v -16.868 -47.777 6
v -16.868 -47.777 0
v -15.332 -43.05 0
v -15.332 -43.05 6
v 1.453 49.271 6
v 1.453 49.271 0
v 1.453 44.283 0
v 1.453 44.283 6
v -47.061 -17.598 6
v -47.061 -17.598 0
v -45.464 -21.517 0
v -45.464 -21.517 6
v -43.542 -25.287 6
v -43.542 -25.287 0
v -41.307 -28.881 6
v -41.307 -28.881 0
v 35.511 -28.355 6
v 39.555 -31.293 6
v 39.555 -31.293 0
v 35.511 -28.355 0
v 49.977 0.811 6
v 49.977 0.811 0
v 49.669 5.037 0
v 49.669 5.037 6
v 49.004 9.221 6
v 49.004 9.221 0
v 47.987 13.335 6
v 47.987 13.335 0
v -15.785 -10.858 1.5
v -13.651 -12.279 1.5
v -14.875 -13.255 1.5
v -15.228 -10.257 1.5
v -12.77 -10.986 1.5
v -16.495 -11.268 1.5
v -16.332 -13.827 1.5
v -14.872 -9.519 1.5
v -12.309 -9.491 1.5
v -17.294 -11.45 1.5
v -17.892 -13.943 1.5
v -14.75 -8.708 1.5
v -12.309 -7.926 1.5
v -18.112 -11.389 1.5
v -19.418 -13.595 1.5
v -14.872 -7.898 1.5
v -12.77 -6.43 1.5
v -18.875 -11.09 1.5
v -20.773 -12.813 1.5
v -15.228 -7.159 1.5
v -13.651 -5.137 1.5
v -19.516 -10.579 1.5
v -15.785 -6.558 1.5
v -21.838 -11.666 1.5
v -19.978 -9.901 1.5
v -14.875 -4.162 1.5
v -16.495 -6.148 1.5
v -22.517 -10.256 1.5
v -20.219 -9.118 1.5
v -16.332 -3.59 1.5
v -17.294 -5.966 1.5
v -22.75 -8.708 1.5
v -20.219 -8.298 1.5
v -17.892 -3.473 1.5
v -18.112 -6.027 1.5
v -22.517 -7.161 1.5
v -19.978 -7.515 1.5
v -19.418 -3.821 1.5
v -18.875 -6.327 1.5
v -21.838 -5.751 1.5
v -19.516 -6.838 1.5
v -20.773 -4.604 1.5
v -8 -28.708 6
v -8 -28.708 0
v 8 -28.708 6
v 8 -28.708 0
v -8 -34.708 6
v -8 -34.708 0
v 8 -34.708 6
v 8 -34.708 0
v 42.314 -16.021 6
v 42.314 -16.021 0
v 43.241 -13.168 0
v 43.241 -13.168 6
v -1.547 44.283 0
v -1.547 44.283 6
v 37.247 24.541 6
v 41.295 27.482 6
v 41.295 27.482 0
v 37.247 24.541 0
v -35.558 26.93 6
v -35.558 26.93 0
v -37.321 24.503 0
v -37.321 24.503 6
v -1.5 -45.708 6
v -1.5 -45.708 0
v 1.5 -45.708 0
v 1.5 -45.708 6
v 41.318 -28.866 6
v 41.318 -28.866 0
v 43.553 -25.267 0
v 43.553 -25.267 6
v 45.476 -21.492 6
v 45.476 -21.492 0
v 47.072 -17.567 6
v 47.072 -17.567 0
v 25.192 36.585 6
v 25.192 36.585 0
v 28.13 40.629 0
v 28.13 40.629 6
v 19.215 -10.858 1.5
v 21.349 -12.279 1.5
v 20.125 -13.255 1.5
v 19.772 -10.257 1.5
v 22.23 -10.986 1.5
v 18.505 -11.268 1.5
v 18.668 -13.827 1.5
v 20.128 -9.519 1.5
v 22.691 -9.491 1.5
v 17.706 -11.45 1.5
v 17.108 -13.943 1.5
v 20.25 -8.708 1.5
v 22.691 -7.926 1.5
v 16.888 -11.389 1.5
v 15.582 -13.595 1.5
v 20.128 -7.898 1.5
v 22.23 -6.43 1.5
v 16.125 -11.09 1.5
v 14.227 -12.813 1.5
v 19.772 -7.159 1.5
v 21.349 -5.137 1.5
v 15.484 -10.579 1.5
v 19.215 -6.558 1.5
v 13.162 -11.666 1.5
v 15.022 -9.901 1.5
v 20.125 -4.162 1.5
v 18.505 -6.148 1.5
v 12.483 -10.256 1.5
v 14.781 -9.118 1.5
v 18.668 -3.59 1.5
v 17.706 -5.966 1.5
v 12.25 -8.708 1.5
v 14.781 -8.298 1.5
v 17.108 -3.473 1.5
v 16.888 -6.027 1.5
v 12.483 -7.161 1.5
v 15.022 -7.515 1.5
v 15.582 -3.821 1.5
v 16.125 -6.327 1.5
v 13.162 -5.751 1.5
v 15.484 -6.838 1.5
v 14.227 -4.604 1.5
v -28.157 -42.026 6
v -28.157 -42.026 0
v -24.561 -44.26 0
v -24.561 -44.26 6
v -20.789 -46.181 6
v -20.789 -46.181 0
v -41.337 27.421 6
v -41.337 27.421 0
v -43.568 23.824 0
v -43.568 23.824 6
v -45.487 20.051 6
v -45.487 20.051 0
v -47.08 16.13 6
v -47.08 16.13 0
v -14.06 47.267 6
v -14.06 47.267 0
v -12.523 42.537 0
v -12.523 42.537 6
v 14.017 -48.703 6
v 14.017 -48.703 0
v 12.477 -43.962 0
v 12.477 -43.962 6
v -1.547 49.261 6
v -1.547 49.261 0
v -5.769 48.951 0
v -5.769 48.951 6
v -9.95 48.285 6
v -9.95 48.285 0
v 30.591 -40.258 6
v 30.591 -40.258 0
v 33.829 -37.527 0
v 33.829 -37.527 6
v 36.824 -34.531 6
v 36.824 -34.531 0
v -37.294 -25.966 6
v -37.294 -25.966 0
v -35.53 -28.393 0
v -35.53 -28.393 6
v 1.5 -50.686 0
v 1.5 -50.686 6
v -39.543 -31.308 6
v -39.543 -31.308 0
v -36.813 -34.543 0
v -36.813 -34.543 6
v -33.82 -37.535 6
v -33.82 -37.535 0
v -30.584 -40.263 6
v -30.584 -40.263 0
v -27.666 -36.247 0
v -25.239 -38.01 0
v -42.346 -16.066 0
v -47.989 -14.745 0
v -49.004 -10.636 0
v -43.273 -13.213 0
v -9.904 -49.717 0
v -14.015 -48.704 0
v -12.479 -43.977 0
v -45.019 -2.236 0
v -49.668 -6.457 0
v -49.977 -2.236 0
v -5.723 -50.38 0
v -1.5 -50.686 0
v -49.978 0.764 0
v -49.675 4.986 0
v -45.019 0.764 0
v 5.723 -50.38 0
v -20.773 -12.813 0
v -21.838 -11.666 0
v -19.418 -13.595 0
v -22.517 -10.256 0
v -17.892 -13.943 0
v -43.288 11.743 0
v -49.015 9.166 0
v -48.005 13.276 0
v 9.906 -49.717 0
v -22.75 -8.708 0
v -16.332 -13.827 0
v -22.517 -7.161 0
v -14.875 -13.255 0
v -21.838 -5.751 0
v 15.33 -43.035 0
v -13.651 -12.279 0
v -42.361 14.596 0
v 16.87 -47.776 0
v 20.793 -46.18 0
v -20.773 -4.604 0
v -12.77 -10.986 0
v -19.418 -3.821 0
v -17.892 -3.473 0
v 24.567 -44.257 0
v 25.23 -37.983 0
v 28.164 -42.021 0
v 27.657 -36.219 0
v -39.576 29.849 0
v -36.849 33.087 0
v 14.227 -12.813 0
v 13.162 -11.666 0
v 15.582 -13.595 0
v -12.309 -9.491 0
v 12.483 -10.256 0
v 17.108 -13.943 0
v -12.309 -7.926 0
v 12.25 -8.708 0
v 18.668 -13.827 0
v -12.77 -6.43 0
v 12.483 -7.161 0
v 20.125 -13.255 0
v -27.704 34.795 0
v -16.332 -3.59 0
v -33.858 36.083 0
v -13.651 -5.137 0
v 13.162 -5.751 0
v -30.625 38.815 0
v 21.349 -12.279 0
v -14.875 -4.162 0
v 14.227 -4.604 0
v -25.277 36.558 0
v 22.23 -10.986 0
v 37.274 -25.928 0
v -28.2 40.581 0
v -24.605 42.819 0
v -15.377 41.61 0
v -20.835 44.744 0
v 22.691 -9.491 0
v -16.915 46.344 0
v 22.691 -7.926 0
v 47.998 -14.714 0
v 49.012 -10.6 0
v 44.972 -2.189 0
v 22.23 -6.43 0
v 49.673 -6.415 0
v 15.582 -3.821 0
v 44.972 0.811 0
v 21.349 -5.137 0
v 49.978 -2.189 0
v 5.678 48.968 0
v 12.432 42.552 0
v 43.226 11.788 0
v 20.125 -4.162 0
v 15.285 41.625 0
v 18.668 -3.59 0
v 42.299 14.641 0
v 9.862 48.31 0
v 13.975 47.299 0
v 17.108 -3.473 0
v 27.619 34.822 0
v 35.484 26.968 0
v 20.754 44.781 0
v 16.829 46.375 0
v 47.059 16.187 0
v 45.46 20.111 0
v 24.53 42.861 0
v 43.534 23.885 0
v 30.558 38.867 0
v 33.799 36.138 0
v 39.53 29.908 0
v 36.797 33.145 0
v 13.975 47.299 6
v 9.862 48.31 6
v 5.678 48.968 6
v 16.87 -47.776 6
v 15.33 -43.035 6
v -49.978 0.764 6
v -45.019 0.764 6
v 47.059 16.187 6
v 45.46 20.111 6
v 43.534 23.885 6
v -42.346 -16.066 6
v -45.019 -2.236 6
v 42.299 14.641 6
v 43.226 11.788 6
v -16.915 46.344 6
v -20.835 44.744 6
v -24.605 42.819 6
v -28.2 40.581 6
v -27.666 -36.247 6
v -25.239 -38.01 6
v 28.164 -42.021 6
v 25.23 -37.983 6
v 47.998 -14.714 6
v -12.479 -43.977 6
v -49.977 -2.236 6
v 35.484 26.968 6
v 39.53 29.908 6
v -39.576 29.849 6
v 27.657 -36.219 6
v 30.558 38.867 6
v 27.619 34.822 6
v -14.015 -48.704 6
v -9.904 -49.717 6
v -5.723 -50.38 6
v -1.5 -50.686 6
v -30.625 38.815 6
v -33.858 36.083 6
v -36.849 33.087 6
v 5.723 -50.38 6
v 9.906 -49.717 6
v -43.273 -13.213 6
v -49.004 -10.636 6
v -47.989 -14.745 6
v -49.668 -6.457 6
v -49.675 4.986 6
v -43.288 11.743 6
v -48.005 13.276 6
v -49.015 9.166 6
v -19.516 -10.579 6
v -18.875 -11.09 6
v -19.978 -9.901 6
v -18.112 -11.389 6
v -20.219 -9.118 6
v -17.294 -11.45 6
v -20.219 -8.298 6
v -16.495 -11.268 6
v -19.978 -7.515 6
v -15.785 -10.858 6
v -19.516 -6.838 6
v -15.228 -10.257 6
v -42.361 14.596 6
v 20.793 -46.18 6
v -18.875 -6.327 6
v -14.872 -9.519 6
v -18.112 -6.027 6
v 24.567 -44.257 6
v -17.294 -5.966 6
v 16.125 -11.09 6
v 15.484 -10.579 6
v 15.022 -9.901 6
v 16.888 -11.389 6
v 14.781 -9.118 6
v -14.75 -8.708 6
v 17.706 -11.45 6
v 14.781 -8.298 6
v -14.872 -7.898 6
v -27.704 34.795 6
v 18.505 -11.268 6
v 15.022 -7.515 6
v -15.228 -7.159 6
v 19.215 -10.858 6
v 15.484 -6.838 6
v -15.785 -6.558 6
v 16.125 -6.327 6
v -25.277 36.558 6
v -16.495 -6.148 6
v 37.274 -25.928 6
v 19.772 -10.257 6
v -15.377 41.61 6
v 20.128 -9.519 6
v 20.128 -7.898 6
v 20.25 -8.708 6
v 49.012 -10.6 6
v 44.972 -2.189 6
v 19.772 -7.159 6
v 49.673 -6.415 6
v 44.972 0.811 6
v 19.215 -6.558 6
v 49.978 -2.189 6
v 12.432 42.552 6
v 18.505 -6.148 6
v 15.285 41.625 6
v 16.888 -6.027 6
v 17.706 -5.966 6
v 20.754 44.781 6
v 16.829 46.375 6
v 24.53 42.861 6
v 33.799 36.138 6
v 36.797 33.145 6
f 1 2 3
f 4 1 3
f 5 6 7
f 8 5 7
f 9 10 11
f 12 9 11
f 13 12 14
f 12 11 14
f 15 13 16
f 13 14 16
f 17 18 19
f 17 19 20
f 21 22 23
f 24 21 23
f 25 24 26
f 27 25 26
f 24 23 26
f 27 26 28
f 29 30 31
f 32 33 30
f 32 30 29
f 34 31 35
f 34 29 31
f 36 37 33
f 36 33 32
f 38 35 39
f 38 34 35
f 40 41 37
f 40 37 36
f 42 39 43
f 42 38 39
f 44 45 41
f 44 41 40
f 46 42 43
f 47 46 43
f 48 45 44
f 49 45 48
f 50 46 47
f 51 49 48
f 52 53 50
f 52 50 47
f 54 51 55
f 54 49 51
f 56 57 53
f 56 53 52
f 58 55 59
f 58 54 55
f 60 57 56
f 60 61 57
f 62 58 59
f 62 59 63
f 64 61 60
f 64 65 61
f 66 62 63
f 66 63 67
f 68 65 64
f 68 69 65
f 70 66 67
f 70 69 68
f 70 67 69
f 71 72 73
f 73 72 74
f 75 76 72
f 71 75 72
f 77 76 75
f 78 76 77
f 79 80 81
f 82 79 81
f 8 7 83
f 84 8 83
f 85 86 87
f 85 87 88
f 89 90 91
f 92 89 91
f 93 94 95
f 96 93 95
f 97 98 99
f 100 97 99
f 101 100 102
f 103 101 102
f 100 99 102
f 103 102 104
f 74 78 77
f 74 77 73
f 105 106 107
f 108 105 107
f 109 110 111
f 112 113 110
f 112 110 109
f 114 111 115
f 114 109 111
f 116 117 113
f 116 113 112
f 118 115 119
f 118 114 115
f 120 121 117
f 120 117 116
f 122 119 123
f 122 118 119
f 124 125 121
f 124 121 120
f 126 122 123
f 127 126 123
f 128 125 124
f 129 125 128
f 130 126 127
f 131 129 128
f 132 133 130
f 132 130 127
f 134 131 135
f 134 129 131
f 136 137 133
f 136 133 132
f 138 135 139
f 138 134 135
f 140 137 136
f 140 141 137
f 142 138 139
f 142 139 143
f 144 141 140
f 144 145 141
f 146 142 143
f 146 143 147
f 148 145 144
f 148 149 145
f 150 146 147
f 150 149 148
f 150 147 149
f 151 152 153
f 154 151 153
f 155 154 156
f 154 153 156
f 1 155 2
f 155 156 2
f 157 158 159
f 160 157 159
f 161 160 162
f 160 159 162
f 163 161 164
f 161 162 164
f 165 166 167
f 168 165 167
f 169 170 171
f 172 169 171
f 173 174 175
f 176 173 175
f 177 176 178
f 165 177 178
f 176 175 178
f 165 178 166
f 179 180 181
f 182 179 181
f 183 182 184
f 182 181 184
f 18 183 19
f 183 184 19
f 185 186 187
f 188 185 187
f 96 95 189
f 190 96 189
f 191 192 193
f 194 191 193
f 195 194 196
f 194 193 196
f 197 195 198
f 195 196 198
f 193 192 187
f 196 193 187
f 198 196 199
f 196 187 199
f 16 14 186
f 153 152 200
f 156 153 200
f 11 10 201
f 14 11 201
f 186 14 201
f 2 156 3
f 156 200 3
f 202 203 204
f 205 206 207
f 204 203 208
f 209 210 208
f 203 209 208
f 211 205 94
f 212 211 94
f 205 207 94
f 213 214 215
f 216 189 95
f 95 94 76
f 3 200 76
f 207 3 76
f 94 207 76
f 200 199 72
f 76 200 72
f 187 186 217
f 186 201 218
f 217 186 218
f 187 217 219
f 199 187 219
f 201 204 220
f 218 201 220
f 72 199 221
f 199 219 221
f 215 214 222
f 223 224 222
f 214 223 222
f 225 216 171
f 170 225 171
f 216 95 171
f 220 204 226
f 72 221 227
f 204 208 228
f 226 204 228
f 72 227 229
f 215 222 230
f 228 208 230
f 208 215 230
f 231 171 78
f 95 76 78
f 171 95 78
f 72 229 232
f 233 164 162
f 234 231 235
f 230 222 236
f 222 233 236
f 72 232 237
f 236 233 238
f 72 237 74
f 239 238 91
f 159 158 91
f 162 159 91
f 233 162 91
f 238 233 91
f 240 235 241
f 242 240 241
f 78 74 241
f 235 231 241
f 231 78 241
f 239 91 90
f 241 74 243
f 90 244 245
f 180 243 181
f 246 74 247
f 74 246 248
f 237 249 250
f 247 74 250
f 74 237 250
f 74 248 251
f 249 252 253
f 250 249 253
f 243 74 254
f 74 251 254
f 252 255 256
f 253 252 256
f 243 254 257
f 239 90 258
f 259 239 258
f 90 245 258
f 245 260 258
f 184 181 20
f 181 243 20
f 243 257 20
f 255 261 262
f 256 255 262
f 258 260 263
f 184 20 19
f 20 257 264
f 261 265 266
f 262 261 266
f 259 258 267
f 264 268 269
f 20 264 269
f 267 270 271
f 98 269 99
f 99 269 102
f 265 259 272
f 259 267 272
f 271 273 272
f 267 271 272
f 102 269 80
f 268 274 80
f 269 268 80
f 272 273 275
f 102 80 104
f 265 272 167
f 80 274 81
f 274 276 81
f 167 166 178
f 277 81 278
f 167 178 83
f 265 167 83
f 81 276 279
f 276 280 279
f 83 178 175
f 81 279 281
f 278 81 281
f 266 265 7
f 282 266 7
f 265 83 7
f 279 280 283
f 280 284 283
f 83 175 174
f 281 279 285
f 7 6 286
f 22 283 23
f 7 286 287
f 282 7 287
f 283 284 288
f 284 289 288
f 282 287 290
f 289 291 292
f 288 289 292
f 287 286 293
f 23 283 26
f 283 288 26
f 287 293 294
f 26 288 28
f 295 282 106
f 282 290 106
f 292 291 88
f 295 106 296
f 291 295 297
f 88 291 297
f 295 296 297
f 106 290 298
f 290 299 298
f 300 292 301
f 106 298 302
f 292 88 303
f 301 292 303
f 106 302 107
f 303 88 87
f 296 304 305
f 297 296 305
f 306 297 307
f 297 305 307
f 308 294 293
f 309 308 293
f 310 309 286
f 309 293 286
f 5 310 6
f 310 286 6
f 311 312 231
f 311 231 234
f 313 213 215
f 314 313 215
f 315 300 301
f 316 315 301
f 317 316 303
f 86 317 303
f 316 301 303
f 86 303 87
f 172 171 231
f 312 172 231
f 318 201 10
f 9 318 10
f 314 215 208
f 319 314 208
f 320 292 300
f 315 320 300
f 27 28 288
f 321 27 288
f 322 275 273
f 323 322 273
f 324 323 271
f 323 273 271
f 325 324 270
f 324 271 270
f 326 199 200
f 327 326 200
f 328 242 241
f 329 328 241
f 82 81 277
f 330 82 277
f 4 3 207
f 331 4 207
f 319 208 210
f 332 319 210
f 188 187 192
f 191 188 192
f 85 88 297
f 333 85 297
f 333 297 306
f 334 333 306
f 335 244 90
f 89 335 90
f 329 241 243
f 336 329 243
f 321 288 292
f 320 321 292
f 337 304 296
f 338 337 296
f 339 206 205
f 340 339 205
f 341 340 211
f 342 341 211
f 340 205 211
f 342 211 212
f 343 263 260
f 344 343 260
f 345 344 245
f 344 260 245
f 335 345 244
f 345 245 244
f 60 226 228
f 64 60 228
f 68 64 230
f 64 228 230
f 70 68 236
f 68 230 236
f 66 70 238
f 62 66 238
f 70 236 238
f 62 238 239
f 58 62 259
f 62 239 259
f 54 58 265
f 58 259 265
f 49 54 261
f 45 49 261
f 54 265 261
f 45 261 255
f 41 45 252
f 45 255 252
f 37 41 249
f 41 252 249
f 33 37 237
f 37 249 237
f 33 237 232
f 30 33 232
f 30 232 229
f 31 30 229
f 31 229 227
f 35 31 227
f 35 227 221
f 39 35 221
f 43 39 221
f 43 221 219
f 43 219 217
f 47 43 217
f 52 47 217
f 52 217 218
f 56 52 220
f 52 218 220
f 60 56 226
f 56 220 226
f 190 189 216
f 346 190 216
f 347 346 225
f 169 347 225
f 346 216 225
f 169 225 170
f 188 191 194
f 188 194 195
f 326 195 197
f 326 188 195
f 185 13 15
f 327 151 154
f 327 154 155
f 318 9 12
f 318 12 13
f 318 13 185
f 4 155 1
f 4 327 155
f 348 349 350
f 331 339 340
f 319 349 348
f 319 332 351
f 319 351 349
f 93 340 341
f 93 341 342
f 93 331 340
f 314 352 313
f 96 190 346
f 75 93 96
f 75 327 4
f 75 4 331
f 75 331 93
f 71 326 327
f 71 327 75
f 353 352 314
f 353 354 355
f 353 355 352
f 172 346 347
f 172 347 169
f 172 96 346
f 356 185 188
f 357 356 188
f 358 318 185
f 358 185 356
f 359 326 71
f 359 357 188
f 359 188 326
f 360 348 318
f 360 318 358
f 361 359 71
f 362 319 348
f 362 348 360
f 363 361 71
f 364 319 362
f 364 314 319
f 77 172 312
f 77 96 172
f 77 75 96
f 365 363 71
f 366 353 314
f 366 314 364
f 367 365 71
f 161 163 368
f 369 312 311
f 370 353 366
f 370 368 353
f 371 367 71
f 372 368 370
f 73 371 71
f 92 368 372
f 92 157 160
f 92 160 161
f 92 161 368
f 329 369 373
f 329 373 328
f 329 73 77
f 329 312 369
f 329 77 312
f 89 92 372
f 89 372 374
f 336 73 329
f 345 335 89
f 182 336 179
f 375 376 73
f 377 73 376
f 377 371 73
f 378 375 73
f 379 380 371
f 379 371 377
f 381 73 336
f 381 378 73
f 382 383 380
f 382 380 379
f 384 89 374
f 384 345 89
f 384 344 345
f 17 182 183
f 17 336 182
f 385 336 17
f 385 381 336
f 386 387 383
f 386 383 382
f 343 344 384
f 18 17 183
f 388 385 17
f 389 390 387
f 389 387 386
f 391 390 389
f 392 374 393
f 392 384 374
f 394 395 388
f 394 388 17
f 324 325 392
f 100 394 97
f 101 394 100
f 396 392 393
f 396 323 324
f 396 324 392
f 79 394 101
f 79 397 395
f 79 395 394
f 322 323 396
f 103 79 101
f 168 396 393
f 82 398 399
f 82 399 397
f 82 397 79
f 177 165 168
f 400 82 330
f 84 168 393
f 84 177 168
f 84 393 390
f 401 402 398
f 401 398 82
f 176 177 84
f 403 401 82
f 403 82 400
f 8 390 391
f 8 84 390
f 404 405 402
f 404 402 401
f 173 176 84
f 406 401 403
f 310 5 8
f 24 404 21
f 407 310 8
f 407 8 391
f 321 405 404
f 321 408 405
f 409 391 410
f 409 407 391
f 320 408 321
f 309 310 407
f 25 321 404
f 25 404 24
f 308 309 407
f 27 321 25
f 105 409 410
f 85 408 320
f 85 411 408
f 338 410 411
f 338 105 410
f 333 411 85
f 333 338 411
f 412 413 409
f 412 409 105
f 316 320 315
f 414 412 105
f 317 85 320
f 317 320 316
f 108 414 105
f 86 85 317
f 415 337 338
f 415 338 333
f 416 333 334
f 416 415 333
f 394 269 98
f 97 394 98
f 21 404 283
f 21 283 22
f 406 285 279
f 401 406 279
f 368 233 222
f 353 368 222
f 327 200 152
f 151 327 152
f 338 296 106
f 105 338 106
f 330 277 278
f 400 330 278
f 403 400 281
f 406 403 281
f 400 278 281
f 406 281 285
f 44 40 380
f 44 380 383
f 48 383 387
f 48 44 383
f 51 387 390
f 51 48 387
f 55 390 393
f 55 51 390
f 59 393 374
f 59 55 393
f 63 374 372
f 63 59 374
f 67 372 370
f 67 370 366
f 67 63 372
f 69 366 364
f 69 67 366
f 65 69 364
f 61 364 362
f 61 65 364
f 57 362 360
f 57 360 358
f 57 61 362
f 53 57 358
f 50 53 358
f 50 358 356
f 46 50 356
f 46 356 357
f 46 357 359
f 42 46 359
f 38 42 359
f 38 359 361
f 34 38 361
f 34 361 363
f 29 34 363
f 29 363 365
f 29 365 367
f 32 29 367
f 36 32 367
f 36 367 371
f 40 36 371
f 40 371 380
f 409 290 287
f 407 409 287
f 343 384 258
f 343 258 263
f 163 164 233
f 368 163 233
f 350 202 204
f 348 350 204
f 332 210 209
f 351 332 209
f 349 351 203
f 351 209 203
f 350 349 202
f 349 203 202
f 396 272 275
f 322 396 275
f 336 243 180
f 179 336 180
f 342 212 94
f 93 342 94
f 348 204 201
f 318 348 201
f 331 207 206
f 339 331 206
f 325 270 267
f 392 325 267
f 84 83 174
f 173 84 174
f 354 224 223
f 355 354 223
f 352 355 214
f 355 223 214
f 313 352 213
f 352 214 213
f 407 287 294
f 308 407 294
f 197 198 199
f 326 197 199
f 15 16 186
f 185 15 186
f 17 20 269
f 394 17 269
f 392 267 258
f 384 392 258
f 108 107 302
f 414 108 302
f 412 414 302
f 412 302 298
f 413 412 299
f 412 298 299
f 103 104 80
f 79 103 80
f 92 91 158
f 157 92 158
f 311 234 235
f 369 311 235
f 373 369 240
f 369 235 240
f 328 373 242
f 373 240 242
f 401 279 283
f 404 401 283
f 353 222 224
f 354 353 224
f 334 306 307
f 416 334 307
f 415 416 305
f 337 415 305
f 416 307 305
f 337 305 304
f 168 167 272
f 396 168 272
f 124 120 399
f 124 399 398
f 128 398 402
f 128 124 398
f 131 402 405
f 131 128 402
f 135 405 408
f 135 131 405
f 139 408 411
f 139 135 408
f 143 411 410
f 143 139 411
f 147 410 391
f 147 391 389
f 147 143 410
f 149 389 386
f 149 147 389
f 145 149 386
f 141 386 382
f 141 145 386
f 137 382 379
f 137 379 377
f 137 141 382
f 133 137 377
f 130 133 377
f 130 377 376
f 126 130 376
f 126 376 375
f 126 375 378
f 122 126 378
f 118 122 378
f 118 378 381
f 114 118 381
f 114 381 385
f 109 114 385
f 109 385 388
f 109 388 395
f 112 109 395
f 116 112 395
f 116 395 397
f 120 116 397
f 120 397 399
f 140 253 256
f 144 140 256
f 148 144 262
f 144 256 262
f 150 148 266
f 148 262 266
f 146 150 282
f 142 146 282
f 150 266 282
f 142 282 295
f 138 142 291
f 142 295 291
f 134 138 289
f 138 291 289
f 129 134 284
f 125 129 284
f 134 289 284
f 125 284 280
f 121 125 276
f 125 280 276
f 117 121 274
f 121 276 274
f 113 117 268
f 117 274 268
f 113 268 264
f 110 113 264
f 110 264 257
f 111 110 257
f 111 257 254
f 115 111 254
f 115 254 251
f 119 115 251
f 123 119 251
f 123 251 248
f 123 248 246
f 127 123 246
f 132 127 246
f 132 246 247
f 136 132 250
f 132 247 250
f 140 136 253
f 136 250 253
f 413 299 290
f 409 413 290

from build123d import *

# Parameters (mm, degrees)
SKETCH2_W           = 16
SKETCH2_H           = 6
SKETCH2_R           = 2.75
BOSS_EXTRUDE1_DEPTH = 6
SKETCH3_R           = 5.25
CUT_EXTRUDE1_DEPTH  = 1.5


with BuildPart() as part:
    # Sketch2 → Boss-Extrude1 (new body)
    with BuildSketch(Plane.XY):
        with BuildLine():
            ThreePointArc((-14.014958559, -48.70381072), (-7.820513245, -50.092784824), (-1.5, -50.685671098))
            Line((-1.5, -50.685671098), (-1.5, -45.708176163))
            Line((-1.5, -45.708176163), (1.5, -45.708176163))
            Line((1.5, -45.708176163), (1.5, -50.685671098))
            ThreePointArc((1.5, -50.685671098), (7.821643905, -50.09260576), (14.017156267, -48.703168924))
            Line((14.017156267, -48.703168924), (12.476730902, -43.962227135))
            Line((12.476730902, -43.962227135), (15.32990045, -43.035176152))
            Line((15.32990045, -43.035176152), (16.870328795, -47.776127109))
            ThreePointArc((16.870328795, -47.776127109), (22.700337229, -45.258088505), (28.164148211, -42.021379325))
            Line((28.164148211, -42.021379325), (25.229863981, -37.982683562))
            Line((25.229863981, -37.982683562), (27.656914964, -36.219327805))
            Line((27.656914964, -36.219327805), (30.591129228, -40.257927268))
            ThreePointArc((30.591129228, -40.257927268), (35.358240772, -36.060613271), (39.55477218, -31.292812793))
            Line((39.55477218, -31.292812793), (35.511033717, -28.354864828))
            Line((35.511033717, -28.354864828), (37.274389474, -25.927813845))
            Line((37.274389474, -25.927813845), (41.317825829, -28.865542317))
            ThreePointArc((41.317825829, -28.865542317), (44.554494815, -23.399517942), (47.071992795, -17.567224011))
            Line((47.071992795, -17.567224011), (42.313847582, -16.021208913))
            Line((42.313847582, -16.021208913), (43.240898565, -13.168039364))
            Line((43.240898565, -13.168039364), (47.998350807, -14.713829302))
            ThreePointArc((47.998350807, -14.713829302), (49.386863483, -8.514437454), (49.978066205, -2.189019992))
            Line((49.978066205, -2.189019992), (44.972398757, -2.189019992))
            Line((44.972398757, -2.189019992), (44.972398757, 0.810980008))
            Line((44.972398757, 0.810980008), (49.976916317, 0.810980008))
            ThreePointArc((49.976916317, 0.810980008), (49.380832331, 7.136146516), (47.987483994, 13.334664716))
            Line((47.987483994, 13.334664716), (43.22644973, 11.787710909))
            Line((43.22644973, 11.787710909), (42.299398746, 14.640880458))
            Line((42.299398746, 14.640880458), (47.058915168, 16.187341088))
            ThreePointArc((47.058915168, 16.187341088), (44.536626084, 22.0182168), (41.295318935, 27.482188044))
            Line((41.295318935, 27.482188044), (37.246906156, 24.540843989))
            Line((37.246906156, 24.540843989), (35.483550399, 26.967894972))
            Line((35.483550399, 26.967894972), (39.530326401, 29.908049839))
            ThreePointArc((39.530326401, 29.908049839), (35.329326435, 34.673156396), (30.558045552, 38.86714256))
            Line((30.558045552, 38.86714256), (27.619087422, 34.822013725))
            Line((27.619087422, 34.822013725), (25.192036439, 36.585369482))
            Line((25.192036439, 36.585369482), (28.129589934, 40.628565002))
            ThreePointArc((28.129589934, 40.628565002), (22.66202489, 43.861237429), (16.828745179, 46.374658668))
            Line((16.828745179, 46.374658668), (15.285431508, 41.62482759))
            Line((15.285431508, 41.62482759), (12.432261959, 42.551878573))
            Line((12.432261959, 42.551878573), (13.974753738, 47.299180128))
            ThreePointArc((13.974753738, 47.299180128), (7.776727495, 48.683346485), (1.453242586, 49.270700235))
            Line((1.453242586, 49.270700235), (1.453242586, 44.283378765))
            Line((1.453242586, 44.283378765), (-1.546757414, 44.283378765))
            Line((-1.546757414, 44.283378765), (-1.546757414, 49.2608737))
            ThreePointArc((-1.546757414, 49.2608737), (-7.866904098, 48.661958763), (-14.060191394, 47.266915506))
            Line((-14.060191394, 47.266915506), (-12.523488315, 42.537429737))
            Line((-12.523488315, 42.537429737), (-15.376657864, 41.610378754))
            Line((-15.376657864, 41.610378754), (-16.914659767, 46.343861891))
            ThreePointArc((-16.914659767, 46.343861891), (-22.740383136, 43.821308169), (-28.199510335, 40.580897657))
            Line((-28.199510335, 40.580897657), (-25.276621395, 36.557886164))
            Line((-25.276621395, 36.557886164), (-27.703672378, 34.794530407))
            Line((-27.703672378, 34.794530407), (-30.624981542, 38.815367524))
            ThreePointArc((-30.624981542, 38.815367524), (-35.385501758, 34.616974444), (-39.575762572, 29.849294558))
            Line((-39.575762572, 29.849294558), (-35.557791131, 26.93006743))
            Line((-35.557791131, 26.93006743), (-37.321146887, 24.503016447))
            Line((-37.321146887, 24.503016447), (-41.33714976, 27.420813327))
            ThreePointArc((-41.33714976, 27.420813327), (-44.567381262, 21.957845266), (-47.079571363, 16.129696634))
            Line((-47.079571363, 16.129696634), (-42.360604995, 14.596411515))
            Line((-42.360604995, 14.596411515), (-43.287655979, 11.743241967))
            Line((-43.287655979, 11.743241967), (-48.004645978, 13.275884924))
            ThreePointArc((-48.004645978, 13.275884924), (-49.389276358, 7.082804571), (-49.978315717, 0.764222594))
            Line((-49.978315717, 0.764222594), (-45.01915617, 0.764222594))
            Line((-45.01915617, 0.764222594), (-45.01915617, -2.235777406))
            Line((-45.01915617, -2.235777406), (-49.976658896, -2.235777406))
            ThreePointArc((-49.976658896, -2.235777406), (-49.380673152, -8.553500826), (-47.989286669, -14.744855434))
            Line((-47.989286669, -14.744855434), (-43.273207143, -13.212508307))
            Line((-43.273207143, -13.212508307), (-42.34615616, -16.065677856))
            Line((-42.34615616, -16.065677856), (-47.06108419, -17.597650839))
            ThreePointArc((-47.06108419, -17.597650839), (-44.542778803, -23.422507686), (-41.306963736, -28.881474636))
            Line((-41.306963736, -28.881474636), (-37.293663569, -25.965641387))
            Line((-37.293663569, -25.965641387), (-35.530307812, -28.39269237))
            Line((-35.530307812, -28.39269237), (-39.542974081, -31.308065065))
            ThreePointArc((-39.542974081, -31.308065065), (-35.348264075, -36.07058879), (-30.584062086, -40.263392586))
            Line((-30.584062086, -40.263392586), (-27.665844836, -36.246811123))
            Line((-27.665844836, -36.246811123), (-25.238793853, -38.01016688))
            Line((-25.238793853, -38.01016688), (-28.156765996, -42.026410983))
            ThreePointArc((-28.156765996, -42.026410983), (-22.695337069, -45.260635975), (-16.868173537, -47.776899552))
            Line((-16.868173537, -47.776899552), (-15.332188921, -43.049624988))
            Line((-15.332188921, -43.049624988), (-12.479019372, -43.976675971))
            Line((-12.479019372, -43.976675971), (-14.014958559, -48.70381072))
        make_face()
        with Locations((0, -31.708176163)):
            Rectangle(SKETCH2_W, SKETCH2_H, mode=Mode.SUBTRACT)
        with Locations((-17.5, -8.708176163)):
            Circle(SKETCH2_R, mode=Mode.SUBTRACT)
        with Locations((17.5, -8.708176163)):
            Circle(SKETCH2_R, mode=Mode.SUBTRACT)
    extrude(amount=BOSS_EXTRUDE1_DEPTH)

    # Sketch3 → Cut-Extrude1 (cut)
    with BuildSketch(Plane(origin=(0, 0, 0), x_dir=(-1, 0, 0), z_dir=(0, 0, -1))):
        with Locations((-17.5, -8.708176163)):
            Circle(SKETCH3_R)
        with Locations((17.5, -8.708176163)):
            Circle(SKETCH3_R)
    extrude(amount=-CUT_EXTRUDE1_DEPTH, mode=Mode.SUBTRACT)


solid = part.part
